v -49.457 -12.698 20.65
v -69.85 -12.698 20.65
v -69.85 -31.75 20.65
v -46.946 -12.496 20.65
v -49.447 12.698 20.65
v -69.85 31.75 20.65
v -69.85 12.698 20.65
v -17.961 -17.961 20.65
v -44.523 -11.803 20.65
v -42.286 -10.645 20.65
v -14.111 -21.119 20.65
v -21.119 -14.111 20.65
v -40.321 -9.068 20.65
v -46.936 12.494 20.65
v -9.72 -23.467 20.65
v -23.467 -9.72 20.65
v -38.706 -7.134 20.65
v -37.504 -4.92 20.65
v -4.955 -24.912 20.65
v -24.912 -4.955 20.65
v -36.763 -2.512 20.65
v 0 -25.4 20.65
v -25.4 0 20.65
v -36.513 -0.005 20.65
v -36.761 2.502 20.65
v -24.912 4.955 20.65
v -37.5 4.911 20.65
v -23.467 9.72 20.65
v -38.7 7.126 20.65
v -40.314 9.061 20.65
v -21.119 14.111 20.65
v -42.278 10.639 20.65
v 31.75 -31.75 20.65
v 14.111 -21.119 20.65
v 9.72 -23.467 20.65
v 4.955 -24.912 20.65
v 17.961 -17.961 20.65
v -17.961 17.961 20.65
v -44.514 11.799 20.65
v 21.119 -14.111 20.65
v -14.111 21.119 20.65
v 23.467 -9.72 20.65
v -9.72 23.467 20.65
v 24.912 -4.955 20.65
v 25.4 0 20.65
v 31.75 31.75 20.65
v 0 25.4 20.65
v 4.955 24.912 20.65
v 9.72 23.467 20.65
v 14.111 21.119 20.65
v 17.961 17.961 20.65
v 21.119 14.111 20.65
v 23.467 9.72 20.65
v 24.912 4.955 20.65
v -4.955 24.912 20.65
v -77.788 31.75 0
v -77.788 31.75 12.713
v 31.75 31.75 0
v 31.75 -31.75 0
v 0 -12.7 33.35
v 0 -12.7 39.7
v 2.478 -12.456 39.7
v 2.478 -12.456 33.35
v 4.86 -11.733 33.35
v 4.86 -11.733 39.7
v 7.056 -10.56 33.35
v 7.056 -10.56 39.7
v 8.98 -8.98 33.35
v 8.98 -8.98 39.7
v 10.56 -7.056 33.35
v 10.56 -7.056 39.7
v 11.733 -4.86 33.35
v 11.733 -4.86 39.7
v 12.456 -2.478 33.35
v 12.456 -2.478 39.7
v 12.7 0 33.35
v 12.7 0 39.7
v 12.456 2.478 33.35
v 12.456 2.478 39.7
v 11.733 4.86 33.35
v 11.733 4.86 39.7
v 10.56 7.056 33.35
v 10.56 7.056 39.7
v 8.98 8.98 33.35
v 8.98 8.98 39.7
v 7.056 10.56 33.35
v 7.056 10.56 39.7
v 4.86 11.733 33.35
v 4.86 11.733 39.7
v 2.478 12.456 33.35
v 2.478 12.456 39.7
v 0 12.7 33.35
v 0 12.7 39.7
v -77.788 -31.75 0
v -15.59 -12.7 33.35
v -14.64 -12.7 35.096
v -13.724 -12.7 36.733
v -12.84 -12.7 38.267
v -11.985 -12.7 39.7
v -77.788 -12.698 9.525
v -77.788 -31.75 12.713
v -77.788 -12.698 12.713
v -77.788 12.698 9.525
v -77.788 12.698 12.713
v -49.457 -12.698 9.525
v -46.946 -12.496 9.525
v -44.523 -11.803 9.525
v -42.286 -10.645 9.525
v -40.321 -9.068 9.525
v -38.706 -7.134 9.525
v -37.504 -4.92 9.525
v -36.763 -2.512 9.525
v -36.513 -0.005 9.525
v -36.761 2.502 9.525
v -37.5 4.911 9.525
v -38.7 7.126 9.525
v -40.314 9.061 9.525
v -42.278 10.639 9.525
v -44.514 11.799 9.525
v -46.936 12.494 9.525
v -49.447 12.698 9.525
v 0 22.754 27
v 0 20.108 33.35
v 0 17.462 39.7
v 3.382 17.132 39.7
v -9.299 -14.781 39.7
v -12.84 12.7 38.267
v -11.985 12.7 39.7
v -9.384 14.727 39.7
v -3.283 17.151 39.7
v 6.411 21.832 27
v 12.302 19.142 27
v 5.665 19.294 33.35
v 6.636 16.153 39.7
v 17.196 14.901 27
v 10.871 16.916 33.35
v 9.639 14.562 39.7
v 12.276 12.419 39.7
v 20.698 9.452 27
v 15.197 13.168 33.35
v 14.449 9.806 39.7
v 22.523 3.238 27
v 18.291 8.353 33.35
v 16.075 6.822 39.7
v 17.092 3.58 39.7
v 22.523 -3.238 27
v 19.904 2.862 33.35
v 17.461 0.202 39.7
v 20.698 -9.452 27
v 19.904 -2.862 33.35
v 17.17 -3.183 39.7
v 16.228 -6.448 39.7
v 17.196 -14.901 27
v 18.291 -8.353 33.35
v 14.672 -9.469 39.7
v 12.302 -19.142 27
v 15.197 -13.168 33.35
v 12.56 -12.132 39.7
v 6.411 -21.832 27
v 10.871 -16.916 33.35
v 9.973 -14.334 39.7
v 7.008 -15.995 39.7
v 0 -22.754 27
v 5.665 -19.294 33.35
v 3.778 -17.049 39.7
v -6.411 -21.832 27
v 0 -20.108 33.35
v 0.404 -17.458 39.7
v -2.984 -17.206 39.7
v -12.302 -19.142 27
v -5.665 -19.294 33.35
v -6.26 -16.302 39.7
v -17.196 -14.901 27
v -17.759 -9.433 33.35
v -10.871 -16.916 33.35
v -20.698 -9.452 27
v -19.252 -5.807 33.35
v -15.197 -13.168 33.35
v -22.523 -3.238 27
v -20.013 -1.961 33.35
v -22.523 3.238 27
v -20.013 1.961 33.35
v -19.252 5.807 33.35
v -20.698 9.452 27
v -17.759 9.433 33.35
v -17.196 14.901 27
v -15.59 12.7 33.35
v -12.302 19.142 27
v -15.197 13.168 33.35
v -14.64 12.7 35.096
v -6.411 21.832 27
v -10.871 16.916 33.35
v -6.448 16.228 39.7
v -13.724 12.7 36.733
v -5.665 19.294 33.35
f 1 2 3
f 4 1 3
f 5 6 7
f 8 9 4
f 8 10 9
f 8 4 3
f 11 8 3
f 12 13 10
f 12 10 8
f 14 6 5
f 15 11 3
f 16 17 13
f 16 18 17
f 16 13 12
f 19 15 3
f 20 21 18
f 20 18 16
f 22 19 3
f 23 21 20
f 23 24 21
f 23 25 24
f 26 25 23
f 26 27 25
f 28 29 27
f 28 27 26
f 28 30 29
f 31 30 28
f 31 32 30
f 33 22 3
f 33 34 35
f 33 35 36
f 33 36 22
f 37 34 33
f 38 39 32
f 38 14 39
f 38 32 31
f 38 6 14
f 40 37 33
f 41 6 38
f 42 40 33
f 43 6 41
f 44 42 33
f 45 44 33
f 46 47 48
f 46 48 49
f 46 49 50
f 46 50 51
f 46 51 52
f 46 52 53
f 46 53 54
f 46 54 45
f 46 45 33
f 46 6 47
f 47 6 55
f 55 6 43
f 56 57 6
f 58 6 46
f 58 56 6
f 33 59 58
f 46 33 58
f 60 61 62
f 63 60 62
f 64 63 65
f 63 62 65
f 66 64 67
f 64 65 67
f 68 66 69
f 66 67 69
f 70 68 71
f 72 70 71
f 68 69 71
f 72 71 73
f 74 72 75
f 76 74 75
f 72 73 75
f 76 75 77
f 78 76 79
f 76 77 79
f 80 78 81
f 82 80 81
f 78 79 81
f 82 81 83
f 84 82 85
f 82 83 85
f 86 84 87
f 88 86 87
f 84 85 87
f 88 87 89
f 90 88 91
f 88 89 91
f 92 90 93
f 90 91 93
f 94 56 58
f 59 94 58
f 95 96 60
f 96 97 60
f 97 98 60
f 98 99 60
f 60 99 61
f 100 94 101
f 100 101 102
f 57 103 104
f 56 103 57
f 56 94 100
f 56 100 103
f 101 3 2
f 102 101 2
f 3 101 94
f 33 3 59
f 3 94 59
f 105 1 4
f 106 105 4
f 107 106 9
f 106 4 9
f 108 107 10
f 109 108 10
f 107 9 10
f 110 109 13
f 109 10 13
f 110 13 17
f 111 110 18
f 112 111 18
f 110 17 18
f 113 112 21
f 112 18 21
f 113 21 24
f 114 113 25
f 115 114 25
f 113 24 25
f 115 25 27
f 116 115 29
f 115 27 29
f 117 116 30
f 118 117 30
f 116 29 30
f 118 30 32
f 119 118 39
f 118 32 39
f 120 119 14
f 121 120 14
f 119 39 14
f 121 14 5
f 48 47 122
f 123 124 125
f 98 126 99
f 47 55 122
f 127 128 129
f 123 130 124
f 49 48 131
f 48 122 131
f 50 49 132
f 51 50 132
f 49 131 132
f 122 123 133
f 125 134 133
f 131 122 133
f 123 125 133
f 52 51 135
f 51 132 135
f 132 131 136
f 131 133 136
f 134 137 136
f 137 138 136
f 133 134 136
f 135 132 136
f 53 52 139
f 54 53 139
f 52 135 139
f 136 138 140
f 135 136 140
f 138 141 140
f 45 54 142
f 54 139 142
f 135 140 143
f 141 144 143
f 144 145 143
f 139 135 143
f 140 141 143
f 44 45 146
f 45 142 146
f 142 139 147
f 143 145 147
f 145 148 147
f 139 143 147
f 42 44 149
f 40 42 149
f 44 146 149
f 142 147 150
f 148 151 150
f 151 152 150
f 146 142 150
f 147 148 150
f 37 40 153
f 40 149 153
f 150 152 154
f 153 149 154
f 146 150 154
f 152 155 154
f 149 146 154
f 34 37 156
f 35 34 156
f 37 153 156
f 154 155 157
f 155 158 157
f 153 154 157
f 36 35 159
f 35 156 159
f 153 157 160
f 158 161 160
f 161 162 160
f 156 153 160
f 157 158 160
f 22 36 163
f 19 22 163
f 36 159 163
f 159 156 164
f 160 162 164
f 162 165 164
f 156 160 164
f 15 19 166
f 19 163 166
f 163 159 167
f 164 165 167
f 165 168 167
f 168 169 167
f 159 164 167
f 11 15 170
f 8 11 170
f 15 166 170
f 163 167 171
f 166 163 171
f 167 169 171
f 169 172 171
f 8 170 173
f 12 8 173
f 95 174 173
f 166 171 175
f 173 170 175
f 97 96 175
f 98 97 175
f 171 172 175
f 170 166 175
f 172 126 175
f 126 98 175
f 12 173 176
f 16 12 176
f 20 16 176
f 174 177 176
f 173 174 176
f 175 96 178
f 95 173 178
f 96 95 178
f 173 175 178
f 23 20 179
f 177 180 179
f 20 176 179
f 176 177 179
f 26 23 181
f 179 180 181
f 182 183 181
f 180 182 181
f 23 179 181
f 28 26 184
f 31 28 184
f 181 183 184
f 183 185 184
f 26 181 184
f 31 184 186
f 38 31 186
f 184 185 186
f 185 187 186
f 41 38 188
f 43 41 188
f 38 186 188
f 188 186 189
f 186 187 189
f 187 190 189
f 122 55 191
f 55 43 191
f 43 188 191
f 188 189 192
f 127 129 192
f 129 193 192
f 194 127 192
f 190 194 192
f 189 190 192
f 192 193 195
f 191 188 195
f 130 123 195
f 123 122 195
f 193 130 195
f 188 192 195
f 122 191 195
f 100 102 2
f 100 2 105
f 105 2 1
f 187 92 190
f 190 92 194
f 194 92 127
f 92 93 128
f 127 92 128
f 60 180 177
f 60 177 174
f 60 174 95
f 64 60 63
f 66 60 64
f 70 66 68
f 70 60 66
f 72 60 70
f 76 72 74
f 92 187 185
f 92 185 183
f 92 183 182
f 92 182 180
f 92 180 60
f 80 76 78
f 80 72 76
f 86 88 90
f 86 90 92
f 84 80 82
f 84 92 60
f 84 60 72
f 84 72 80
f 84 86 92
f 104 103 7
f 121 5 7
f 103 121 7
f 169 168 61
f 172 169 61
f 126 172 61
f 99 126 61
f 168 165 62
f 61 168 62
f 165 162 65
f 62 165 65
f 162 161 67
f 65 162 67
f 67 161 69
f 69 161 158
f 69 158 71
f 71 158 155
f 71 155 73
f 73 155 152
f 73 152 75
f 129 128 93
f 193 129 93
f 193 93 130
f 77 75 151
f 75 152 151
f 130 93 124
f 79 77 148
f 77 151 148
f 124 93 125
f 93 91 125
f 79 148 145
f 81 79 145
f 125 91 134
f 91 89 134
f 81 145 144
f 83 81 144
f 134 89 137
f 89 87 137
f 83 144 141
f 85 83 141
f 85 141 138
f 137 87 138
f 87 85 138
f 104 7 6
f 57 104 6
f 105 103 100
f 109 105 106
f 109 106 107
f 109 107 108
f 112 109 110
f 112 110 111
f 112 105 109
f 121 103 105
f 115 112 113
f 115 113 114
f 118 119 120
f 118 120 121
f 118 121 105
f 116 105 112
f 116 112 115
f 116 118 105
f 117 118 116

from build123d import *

# Parameters (mm, degrees)
F0_W     = 109.5375
F0_H     = 63.5
F1_DEPTH = 20.6502
F5_DEPTH = 6.35
F7_DEPTH = 11.1252
F8_SIZE  = 7.9375


with BuildPart() as f1:
    # F0 (on Top) → F1 (new body)
    with BuildSketch(Plane.XY):
        with Locations((-23.01875, 0)):
            Rectangle(F0_W, F0_H)
    extrude(amount=F1_DEPTH)

    # F2 (on Right) → F3 (revolve)
    with BuildSketch(Plane.YZ):
        Polygon((0, 20.6502), (25.4, 20.6502), (17.4625, 39.7002), (0, 39.7002), align=None)
    revolve(axis=Axis((0, 0, 30.1752), (0, 0, -1)))

    # F4 (on face) → F5 (cut)
    with BuildSketch(Plane.XY.offset(39.7002)):
        with BuildLine():
            Line((-30.736892, -12.7), (-11.985362, -12.7))
            ThreePointArc((-11.985362, -12.7), (-17.4625, 0), (-11.985362, 12.7))
            Line((-11.985362, 12.7), (-30.736892, 12.7))
            Line((-30.736892, 12.7), (-30.736892, -12.7))
        make_face()
        with BuildLine():
            Line((-11.985362, -12.7), (0, -12.7))
            ThreePointArc((0, -12.7), (12.7, 0), (0, 12.7))
            Line((0, 12.7), (-11.985362, 12.7))
            ThreePointArc((-11.985362, 12.7), (-17.4625, 0), (-11.985362, -12.7))
        make_face()
    extrude(amount=-F5_DEPTH, mode=Mode.SUBTRACT)

    # F6 (on face) → F7 (cut)
    with BuildSketch(Plane.XY.offset(20.6502)):
        with BuildLine():
            Line((-77.7875, -12.697648), (-49.456894, -12.697648))
            ThreePointArc((-49.456894, -12.697648), (-36.512501, -0.004972), (-49.446951, 12.697836))
            Line((-49.446951, 12.697836), (-77.7875, 12.697836))
            Line((-77.7875, 12.697836), (-77.7875, -12.697648))
        make_face()
    extrude(amount=-F7_DEPTH, mode=Mode.SUBTRACT)

    # F8
    f8_edges = [f1.edges().sort_by_distance(p)[0] for p in [
        (-77.7875, -22.223824, 20.6502),
        (-77.7875, 22.223918, 20.6502),
    ]]
    chamfer(f8_edges, length=F8_SIZE)


solid = f1.part
